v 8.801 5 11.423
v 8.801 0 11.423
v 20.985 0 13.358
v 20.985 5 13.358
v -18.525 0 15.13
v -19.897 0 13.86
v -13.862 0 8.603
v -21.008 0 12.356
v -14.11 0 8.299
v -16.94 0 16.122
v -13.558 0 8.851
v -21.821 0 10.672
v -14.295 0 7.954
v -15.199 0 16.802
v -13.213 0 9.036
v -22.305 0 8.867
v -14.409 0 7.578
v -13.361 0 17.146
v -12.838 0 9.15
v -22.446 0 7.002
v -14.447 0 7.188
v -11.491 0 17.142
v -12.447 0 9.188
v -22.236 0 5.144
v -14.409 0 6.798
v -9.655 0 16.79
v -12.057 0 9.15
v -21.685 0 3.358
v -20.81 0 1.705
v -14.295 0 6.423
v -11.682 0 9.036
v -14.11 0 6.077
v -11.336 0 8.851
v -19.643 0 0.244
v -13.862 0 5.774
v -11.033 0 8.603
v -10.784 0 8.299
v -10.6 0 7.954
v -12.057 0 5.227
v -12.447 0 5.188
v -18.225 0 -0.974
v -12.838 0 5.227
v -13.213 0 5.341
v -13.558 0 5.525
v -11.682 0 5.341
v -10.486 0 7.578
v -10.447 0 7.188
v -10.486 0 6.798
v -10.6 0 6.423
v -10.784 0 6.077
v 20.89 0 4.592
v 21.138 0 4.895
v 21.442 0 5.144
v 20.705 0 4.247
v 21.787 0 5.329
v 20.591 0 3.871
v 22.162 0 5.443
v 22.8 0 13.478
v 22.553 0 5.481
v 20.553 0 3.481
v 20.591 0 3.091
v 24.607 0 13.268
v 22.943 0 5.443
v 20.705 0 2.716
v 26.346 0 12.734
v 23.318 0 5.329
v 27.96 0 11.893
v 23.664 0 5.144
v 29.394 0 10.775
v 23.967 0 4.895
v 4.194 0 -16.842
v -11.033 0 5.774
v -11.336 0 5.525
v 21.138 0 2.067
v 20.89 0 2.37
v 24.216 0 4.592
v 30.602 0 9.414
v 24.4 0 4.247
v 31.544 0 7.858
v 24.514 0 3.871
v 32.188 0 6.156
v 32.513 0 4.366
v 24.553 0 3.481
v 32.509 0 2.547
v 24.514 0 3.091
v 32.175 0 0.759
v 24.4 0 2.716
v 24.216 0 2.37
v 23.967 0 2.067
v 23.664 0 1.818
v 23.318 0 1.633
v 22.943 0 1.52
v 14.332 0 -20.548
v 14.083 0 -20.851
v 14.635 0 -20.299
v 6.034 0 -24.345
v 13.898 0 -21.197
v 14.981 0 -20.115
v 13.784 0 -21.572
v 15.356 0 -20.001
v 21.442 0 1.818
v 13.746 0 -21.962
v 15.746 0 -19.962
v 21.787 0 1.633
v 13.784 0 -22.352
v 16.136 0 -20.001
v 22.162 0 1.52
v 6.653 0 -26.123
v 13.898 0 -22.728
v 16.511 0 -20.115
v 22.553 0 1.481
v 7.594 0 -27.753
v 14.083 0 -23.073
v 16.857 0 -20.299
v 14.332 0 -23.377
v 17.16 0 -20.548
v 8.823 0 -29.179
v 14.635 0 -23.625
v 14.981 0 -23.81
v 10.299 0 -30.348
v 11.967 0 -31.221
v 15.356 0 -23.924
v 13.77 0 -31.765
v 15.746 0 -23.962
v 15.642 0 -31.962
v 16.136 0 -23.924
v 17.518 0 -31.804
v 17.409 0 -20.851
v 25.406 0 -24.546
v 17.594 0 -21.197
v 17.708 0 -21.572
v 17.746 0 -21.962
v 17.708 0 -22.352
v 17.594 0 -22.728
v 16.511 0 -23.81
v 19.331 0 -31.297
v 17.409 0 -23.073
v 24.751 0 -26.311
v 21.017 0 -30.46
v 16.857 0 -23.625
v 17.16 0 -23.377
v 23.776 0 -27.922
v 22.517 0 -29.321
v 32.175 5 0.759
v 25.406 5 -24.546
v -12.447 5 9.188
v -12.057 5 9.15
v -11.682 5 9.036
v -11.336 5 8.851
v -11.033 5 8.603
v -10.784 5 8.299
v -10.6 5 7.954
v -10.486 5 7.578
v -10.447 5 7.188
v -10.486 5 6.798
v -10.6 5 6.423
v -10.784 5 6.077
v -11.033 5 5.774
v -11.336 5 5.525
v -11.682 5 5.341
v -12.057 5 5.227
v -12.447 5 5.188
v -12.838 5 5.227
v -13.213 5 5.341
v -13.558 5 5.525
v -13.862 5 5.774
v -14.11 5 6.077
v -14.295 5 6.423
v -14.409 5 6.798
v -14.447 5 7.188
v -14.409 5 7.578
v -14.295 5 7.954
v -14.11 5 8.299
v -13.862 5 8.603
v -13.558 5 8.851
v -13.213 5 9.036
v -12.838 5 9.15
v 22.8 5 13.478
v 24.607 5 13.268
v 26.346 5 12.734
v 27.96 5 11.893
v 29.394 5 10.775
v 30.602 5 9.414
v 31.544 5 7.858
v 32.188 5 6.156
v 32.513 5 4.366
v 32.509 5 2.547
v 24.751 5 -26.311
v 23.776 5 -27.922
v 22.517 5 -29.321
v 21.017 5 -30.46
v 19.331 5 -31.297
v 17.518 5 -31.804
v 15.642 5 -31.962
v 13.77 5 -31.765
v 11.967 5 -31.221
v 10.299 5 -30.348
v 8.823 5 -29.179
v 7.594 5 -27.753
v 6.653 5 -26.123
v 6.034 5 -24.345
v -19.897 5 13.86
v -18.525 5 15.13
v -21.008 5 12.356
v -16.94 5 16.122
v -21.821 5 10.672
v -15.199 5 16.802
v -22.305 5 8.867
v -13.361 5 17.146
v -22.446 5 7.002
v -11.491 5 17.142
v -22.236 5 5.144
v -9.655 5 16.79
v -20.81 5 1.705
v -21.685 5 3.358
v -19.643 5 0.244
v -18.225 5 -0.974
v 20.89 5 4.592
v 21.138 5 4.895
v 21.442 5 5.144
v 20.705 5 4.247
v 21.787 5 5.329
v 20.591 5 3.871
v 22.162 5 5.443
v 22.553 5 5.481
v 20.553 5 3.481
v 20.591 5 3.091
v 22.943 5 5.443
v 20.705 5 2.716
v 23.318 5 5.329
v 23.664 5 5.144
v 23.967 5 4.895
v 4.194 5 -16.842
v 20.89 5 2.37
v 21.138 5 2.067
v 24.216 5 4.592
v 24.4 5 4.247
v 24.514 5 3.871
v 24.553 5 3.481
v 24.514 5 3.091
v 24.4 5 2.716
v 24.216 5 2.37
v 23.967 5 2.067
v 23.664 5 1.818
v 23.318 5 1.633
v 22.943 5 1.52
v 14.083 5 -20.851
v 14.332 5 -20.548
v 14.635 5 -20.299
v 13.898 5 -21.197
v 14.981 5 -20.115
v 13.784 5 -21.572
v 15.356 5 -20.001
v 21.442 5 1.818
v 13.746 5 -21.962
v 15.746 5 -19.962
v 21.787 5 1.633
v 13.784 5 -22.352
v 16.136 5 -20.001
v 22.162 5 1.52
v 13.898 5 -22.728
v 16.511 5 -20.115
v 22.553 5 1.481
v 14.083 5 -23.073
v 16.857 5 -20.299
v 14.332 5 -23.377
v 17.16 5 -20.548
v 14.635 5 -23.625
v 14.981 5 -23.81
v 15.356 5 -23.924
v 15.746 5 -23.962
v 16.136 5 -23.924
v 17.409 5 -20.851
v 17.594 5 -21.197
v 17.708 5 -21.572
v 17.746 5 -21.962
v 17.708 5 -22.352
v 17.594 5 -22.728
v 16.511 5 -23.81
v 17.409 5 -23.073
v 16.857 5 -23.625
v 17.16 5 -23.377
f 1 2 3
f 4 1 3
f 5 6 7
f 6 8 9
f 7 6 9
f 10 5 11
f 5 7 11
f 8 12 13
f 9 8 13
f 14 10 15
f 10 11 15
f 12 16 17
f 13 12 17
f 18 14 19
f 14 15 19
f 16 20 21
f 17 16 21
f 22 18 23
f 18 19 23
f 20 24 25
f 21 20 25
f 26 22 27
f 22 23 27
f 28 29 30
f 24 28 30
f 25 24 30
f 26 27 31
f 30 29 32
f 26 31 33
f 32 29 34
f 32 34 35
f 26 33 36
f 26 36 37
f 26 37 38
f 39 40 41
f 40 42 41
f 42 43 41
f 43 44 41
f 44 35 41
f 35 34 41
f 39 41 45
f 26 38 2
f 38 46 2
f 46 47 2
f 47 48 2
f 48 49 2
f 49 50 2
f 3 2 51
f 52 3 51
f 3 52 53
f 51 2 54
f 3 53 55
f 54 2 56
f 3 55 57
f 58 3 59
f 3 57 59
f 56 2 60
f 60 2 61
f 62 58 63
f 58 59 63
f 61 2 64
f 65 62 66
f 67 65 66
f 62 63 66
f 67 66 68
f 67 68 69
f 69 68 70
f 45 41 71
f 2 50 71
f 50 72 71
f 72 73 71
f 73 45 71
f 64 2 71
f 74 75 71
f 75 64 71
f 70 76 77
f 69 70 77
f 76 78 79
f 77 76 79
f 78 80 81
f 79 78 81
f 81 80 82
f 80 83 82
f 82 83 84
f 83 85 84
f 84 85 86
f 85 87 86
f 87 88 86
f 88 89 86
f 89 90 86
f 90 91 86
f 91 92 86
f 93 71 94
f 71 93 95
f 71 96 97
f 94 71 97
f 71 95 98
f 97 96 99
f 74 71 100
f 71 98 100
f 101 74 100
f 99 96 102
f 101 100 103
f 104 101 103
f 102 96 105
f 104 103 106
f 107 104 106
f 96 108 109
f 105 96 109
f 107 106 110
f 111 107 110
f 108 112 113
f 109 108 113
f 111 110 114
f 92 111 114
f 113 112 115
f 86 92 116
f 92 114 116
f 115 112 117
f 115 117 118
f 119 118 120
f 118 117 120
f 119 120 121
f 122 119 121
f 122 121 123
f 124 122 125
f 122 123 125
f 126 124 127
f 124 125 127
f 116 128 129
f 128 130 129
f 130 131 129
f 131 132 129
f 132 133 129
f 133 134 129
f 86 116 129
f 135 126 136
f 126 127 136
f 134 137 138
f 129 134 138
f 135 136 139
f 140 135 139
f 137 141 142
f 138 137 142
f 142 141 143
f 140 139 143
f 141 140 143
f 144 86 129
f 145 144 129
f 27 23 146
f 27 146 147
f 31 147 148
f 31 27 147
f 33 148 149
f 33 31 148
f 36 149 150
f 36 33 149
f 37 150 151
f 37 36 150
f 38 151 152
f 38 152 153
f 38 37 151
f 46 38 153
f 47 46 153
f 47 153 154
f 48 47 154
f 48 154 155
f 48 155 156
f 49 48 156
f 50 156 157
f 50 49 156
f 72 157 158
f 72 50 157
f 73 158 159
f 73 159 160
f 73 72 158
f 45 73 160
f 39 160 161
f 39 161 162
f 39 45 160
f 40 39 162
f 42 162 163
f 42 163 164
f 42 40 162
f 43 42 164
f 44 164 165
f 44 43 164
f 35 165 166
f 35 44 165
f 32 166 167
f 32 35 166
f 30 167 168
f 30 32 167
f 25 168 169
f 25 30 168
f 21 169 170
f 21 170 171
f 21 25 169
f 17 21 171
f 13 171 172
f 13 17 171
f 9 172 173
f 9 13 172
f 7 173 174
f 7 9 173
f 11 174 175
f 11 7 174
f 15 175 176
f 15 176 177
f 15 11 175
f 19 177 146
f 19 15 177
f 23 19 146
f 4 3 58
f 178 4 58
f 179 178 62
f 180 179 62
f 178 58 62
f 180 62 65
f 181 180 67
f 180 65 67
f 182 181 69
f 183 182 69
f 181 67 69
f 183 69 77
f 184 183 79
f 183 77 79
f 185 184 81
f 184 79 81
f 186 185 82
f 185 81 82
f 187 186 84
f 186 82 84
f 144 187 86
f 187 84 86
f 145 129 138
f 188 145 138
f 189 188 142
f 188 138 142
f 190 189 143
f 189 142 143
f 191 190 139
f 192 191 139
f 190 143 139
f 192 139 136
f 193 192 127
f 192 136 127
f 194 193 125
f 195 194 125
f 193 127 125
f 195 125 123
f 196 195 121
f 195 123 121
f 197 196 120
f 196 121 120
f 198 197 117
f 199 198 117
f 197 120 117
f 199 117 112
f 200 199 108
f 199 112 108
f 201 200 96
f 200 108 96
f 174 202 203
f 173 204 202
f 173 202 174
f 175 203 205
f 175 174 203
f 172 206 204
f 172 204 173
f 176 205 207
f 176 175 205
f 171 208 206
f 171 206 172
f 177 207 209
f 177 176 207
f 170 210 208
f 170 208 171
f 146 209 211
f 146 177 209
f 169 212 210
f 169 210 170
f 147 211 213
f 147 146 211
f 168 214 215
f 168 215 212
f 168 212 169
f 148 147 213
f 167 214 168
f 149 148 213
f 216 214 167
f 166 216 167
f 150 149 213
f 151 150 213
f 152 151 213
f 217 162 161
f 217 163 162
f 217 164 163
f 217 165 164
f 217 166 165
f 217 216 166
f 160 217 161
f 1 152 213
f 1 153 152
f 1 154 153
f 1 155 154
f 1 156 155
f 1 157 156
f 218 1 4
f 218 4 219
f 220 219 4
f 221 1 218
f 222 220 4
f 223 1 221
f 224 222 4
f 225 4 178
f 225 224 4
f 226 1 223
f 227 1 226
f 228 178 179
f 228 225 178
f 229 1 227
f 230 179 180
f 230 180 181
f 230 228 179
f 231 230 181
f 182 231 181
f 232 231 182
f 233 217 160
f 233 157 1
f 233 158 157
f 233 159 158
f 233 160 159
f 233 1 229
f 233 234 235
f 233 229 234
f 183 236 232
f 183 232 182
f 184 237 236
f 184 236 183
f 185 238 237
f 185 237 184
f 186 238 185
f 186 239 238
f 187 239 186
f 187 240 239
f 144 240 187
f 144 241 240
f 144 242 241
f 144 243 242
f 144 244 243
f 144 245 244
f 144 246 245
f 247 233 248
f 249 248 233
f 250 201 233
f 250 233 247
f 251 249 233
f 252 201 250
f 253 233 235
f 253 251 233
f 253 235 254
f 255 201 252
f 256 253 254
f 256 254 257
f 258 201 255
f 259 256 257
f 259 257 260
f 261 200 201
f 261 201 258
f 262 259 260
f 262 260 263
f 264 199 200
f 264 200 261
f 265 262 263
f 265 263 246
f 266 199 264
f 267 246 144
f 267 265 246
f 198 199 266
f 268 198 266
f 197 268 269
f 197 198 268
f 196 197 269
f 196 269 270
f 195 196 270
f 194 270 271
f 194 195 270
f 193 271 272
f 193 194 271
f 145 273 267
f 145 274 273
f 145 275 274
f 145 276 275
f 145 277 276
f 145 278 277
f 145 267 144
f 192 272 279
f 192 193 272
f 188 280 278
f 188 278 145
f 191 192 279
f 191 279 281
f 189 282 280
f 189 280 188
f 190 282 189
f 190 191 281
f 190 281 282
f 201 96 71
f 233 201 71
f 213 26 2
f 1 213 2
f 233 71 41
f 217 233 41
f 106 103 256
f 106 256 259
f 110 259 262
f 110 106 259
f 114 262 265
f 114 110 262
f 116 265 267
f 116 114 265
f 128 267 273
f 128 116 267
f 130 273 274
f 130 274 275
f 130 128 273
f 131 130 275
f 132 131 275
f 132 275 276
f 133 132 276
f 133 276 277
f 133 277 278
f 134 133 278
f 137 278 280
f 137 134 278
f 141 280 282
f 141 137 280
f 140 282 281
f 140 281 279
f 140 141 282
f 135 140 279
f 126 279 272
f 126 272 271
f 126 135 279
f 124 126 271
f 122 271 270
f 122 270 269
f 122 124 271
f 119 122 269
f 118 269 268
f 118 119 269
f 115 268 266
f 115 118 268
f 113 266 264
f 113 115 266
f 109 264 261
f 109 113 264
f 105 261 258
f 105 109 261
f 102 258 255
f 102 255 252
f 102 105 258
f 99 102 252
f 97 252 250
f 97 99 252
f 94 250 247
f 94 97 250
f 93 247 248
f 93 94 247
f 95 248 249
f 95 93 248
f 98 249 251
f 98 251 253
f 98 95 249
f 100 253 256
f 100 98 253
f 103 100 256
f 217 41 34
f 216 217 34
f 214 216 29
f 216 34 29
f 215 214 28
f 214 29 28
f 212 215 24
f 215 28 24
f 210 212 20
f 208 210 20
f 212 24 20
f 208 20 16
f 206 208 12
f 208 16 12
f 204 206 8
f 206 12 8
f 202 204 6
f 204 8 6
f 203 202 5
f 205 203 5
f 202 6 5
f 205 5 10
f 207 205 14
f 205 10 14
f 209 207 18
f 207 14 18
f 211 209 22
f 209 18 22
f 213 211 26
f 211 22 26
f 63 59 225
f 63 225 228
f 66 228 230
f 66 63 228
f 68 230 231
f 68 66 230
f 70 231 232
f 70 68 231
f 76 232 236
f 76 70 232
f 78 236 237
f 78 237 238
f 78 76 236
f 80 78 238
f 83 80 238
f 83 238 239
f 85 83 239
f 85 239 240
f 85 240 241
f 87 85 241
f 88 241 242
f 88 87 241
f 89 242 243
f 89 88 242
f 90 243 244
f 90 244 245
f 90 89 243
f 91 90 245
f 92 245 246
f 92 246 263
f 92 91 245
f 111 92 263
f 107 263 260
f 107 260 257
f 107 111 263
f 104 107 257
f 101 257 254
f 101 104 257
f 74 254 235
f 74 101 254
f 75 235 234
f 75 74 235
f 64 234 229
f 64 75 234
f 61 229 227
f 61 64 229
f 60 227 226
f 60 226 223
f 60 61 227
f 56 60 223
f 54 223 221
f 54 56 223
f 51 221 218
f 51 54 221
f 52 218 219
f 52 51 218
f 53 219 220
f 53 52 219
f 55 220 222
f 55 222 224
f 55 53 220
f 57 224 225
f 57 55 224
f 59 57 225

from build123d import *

# Parameters (mm, degrees)
SKIZZE1_R                       = 2
AUFSATZ_LINEAR_AUSTRAGEN1_DEPTH = 5


with BuildPart() as part:
    # Skizze1 → Aufsatz-Linear austragen1 (new body)
    with BuildSketch(Plane(origin=(0, 0, 0), x_dir=(1, 0, 0), z_dir=(0, 1, 0))):
        with BuildLine():
            Line((32.174930969, -0.758710751), (25.406405474, 24.546237926))
            ThreePointArc((25.406405474, 24.546237926), (15.641921228, 31.961749958), (6.033920269, 24.344579298))
            Line((6.033920269, 24.344579298), (4.193711044, 16.842429276))
            Line((4.193711044, 16.842429276), (-18.224781404, 0.973862232))
            ThreePointArc((-18.224781404, 0.973862232), (-21.454022597, -11.53334461), (-9.654845468, -16.790495999))
            Line((-9.654845468, -16.790495999), (8.801061186, -11.423209418))
            Line((8.801061186, -11.423209418), (20.984655174, -13.357550953))
            ThreePointArc((20.984655174, -13.357550953), (30.029331036, -10.12200662), (32.174930969, -0.758710751))
        make_face()
        with Locations(Location((22.552676727, -3.481250613, 0), (0, 0, 270))):
            Circle(SKIZZE1_R, mode=Mode.SUBTRACT)
        with Locations(Location((-12.447323273, -7.188305222, 0), (0, 0, 270))):
            Circle(SKIZZE1_R, mode=Mode.SUBTRACT)
        with Locations(Location((15.746010972, 21.962291706, 0), (0, 0, 270))):
            Circle(SKIZZE1_R, mode=Mode.SUBTRACT)
    extrude(amount=AUFSATZ_LINEAR_AUSTRAGEN1_DEPTH)


solid = part.part
